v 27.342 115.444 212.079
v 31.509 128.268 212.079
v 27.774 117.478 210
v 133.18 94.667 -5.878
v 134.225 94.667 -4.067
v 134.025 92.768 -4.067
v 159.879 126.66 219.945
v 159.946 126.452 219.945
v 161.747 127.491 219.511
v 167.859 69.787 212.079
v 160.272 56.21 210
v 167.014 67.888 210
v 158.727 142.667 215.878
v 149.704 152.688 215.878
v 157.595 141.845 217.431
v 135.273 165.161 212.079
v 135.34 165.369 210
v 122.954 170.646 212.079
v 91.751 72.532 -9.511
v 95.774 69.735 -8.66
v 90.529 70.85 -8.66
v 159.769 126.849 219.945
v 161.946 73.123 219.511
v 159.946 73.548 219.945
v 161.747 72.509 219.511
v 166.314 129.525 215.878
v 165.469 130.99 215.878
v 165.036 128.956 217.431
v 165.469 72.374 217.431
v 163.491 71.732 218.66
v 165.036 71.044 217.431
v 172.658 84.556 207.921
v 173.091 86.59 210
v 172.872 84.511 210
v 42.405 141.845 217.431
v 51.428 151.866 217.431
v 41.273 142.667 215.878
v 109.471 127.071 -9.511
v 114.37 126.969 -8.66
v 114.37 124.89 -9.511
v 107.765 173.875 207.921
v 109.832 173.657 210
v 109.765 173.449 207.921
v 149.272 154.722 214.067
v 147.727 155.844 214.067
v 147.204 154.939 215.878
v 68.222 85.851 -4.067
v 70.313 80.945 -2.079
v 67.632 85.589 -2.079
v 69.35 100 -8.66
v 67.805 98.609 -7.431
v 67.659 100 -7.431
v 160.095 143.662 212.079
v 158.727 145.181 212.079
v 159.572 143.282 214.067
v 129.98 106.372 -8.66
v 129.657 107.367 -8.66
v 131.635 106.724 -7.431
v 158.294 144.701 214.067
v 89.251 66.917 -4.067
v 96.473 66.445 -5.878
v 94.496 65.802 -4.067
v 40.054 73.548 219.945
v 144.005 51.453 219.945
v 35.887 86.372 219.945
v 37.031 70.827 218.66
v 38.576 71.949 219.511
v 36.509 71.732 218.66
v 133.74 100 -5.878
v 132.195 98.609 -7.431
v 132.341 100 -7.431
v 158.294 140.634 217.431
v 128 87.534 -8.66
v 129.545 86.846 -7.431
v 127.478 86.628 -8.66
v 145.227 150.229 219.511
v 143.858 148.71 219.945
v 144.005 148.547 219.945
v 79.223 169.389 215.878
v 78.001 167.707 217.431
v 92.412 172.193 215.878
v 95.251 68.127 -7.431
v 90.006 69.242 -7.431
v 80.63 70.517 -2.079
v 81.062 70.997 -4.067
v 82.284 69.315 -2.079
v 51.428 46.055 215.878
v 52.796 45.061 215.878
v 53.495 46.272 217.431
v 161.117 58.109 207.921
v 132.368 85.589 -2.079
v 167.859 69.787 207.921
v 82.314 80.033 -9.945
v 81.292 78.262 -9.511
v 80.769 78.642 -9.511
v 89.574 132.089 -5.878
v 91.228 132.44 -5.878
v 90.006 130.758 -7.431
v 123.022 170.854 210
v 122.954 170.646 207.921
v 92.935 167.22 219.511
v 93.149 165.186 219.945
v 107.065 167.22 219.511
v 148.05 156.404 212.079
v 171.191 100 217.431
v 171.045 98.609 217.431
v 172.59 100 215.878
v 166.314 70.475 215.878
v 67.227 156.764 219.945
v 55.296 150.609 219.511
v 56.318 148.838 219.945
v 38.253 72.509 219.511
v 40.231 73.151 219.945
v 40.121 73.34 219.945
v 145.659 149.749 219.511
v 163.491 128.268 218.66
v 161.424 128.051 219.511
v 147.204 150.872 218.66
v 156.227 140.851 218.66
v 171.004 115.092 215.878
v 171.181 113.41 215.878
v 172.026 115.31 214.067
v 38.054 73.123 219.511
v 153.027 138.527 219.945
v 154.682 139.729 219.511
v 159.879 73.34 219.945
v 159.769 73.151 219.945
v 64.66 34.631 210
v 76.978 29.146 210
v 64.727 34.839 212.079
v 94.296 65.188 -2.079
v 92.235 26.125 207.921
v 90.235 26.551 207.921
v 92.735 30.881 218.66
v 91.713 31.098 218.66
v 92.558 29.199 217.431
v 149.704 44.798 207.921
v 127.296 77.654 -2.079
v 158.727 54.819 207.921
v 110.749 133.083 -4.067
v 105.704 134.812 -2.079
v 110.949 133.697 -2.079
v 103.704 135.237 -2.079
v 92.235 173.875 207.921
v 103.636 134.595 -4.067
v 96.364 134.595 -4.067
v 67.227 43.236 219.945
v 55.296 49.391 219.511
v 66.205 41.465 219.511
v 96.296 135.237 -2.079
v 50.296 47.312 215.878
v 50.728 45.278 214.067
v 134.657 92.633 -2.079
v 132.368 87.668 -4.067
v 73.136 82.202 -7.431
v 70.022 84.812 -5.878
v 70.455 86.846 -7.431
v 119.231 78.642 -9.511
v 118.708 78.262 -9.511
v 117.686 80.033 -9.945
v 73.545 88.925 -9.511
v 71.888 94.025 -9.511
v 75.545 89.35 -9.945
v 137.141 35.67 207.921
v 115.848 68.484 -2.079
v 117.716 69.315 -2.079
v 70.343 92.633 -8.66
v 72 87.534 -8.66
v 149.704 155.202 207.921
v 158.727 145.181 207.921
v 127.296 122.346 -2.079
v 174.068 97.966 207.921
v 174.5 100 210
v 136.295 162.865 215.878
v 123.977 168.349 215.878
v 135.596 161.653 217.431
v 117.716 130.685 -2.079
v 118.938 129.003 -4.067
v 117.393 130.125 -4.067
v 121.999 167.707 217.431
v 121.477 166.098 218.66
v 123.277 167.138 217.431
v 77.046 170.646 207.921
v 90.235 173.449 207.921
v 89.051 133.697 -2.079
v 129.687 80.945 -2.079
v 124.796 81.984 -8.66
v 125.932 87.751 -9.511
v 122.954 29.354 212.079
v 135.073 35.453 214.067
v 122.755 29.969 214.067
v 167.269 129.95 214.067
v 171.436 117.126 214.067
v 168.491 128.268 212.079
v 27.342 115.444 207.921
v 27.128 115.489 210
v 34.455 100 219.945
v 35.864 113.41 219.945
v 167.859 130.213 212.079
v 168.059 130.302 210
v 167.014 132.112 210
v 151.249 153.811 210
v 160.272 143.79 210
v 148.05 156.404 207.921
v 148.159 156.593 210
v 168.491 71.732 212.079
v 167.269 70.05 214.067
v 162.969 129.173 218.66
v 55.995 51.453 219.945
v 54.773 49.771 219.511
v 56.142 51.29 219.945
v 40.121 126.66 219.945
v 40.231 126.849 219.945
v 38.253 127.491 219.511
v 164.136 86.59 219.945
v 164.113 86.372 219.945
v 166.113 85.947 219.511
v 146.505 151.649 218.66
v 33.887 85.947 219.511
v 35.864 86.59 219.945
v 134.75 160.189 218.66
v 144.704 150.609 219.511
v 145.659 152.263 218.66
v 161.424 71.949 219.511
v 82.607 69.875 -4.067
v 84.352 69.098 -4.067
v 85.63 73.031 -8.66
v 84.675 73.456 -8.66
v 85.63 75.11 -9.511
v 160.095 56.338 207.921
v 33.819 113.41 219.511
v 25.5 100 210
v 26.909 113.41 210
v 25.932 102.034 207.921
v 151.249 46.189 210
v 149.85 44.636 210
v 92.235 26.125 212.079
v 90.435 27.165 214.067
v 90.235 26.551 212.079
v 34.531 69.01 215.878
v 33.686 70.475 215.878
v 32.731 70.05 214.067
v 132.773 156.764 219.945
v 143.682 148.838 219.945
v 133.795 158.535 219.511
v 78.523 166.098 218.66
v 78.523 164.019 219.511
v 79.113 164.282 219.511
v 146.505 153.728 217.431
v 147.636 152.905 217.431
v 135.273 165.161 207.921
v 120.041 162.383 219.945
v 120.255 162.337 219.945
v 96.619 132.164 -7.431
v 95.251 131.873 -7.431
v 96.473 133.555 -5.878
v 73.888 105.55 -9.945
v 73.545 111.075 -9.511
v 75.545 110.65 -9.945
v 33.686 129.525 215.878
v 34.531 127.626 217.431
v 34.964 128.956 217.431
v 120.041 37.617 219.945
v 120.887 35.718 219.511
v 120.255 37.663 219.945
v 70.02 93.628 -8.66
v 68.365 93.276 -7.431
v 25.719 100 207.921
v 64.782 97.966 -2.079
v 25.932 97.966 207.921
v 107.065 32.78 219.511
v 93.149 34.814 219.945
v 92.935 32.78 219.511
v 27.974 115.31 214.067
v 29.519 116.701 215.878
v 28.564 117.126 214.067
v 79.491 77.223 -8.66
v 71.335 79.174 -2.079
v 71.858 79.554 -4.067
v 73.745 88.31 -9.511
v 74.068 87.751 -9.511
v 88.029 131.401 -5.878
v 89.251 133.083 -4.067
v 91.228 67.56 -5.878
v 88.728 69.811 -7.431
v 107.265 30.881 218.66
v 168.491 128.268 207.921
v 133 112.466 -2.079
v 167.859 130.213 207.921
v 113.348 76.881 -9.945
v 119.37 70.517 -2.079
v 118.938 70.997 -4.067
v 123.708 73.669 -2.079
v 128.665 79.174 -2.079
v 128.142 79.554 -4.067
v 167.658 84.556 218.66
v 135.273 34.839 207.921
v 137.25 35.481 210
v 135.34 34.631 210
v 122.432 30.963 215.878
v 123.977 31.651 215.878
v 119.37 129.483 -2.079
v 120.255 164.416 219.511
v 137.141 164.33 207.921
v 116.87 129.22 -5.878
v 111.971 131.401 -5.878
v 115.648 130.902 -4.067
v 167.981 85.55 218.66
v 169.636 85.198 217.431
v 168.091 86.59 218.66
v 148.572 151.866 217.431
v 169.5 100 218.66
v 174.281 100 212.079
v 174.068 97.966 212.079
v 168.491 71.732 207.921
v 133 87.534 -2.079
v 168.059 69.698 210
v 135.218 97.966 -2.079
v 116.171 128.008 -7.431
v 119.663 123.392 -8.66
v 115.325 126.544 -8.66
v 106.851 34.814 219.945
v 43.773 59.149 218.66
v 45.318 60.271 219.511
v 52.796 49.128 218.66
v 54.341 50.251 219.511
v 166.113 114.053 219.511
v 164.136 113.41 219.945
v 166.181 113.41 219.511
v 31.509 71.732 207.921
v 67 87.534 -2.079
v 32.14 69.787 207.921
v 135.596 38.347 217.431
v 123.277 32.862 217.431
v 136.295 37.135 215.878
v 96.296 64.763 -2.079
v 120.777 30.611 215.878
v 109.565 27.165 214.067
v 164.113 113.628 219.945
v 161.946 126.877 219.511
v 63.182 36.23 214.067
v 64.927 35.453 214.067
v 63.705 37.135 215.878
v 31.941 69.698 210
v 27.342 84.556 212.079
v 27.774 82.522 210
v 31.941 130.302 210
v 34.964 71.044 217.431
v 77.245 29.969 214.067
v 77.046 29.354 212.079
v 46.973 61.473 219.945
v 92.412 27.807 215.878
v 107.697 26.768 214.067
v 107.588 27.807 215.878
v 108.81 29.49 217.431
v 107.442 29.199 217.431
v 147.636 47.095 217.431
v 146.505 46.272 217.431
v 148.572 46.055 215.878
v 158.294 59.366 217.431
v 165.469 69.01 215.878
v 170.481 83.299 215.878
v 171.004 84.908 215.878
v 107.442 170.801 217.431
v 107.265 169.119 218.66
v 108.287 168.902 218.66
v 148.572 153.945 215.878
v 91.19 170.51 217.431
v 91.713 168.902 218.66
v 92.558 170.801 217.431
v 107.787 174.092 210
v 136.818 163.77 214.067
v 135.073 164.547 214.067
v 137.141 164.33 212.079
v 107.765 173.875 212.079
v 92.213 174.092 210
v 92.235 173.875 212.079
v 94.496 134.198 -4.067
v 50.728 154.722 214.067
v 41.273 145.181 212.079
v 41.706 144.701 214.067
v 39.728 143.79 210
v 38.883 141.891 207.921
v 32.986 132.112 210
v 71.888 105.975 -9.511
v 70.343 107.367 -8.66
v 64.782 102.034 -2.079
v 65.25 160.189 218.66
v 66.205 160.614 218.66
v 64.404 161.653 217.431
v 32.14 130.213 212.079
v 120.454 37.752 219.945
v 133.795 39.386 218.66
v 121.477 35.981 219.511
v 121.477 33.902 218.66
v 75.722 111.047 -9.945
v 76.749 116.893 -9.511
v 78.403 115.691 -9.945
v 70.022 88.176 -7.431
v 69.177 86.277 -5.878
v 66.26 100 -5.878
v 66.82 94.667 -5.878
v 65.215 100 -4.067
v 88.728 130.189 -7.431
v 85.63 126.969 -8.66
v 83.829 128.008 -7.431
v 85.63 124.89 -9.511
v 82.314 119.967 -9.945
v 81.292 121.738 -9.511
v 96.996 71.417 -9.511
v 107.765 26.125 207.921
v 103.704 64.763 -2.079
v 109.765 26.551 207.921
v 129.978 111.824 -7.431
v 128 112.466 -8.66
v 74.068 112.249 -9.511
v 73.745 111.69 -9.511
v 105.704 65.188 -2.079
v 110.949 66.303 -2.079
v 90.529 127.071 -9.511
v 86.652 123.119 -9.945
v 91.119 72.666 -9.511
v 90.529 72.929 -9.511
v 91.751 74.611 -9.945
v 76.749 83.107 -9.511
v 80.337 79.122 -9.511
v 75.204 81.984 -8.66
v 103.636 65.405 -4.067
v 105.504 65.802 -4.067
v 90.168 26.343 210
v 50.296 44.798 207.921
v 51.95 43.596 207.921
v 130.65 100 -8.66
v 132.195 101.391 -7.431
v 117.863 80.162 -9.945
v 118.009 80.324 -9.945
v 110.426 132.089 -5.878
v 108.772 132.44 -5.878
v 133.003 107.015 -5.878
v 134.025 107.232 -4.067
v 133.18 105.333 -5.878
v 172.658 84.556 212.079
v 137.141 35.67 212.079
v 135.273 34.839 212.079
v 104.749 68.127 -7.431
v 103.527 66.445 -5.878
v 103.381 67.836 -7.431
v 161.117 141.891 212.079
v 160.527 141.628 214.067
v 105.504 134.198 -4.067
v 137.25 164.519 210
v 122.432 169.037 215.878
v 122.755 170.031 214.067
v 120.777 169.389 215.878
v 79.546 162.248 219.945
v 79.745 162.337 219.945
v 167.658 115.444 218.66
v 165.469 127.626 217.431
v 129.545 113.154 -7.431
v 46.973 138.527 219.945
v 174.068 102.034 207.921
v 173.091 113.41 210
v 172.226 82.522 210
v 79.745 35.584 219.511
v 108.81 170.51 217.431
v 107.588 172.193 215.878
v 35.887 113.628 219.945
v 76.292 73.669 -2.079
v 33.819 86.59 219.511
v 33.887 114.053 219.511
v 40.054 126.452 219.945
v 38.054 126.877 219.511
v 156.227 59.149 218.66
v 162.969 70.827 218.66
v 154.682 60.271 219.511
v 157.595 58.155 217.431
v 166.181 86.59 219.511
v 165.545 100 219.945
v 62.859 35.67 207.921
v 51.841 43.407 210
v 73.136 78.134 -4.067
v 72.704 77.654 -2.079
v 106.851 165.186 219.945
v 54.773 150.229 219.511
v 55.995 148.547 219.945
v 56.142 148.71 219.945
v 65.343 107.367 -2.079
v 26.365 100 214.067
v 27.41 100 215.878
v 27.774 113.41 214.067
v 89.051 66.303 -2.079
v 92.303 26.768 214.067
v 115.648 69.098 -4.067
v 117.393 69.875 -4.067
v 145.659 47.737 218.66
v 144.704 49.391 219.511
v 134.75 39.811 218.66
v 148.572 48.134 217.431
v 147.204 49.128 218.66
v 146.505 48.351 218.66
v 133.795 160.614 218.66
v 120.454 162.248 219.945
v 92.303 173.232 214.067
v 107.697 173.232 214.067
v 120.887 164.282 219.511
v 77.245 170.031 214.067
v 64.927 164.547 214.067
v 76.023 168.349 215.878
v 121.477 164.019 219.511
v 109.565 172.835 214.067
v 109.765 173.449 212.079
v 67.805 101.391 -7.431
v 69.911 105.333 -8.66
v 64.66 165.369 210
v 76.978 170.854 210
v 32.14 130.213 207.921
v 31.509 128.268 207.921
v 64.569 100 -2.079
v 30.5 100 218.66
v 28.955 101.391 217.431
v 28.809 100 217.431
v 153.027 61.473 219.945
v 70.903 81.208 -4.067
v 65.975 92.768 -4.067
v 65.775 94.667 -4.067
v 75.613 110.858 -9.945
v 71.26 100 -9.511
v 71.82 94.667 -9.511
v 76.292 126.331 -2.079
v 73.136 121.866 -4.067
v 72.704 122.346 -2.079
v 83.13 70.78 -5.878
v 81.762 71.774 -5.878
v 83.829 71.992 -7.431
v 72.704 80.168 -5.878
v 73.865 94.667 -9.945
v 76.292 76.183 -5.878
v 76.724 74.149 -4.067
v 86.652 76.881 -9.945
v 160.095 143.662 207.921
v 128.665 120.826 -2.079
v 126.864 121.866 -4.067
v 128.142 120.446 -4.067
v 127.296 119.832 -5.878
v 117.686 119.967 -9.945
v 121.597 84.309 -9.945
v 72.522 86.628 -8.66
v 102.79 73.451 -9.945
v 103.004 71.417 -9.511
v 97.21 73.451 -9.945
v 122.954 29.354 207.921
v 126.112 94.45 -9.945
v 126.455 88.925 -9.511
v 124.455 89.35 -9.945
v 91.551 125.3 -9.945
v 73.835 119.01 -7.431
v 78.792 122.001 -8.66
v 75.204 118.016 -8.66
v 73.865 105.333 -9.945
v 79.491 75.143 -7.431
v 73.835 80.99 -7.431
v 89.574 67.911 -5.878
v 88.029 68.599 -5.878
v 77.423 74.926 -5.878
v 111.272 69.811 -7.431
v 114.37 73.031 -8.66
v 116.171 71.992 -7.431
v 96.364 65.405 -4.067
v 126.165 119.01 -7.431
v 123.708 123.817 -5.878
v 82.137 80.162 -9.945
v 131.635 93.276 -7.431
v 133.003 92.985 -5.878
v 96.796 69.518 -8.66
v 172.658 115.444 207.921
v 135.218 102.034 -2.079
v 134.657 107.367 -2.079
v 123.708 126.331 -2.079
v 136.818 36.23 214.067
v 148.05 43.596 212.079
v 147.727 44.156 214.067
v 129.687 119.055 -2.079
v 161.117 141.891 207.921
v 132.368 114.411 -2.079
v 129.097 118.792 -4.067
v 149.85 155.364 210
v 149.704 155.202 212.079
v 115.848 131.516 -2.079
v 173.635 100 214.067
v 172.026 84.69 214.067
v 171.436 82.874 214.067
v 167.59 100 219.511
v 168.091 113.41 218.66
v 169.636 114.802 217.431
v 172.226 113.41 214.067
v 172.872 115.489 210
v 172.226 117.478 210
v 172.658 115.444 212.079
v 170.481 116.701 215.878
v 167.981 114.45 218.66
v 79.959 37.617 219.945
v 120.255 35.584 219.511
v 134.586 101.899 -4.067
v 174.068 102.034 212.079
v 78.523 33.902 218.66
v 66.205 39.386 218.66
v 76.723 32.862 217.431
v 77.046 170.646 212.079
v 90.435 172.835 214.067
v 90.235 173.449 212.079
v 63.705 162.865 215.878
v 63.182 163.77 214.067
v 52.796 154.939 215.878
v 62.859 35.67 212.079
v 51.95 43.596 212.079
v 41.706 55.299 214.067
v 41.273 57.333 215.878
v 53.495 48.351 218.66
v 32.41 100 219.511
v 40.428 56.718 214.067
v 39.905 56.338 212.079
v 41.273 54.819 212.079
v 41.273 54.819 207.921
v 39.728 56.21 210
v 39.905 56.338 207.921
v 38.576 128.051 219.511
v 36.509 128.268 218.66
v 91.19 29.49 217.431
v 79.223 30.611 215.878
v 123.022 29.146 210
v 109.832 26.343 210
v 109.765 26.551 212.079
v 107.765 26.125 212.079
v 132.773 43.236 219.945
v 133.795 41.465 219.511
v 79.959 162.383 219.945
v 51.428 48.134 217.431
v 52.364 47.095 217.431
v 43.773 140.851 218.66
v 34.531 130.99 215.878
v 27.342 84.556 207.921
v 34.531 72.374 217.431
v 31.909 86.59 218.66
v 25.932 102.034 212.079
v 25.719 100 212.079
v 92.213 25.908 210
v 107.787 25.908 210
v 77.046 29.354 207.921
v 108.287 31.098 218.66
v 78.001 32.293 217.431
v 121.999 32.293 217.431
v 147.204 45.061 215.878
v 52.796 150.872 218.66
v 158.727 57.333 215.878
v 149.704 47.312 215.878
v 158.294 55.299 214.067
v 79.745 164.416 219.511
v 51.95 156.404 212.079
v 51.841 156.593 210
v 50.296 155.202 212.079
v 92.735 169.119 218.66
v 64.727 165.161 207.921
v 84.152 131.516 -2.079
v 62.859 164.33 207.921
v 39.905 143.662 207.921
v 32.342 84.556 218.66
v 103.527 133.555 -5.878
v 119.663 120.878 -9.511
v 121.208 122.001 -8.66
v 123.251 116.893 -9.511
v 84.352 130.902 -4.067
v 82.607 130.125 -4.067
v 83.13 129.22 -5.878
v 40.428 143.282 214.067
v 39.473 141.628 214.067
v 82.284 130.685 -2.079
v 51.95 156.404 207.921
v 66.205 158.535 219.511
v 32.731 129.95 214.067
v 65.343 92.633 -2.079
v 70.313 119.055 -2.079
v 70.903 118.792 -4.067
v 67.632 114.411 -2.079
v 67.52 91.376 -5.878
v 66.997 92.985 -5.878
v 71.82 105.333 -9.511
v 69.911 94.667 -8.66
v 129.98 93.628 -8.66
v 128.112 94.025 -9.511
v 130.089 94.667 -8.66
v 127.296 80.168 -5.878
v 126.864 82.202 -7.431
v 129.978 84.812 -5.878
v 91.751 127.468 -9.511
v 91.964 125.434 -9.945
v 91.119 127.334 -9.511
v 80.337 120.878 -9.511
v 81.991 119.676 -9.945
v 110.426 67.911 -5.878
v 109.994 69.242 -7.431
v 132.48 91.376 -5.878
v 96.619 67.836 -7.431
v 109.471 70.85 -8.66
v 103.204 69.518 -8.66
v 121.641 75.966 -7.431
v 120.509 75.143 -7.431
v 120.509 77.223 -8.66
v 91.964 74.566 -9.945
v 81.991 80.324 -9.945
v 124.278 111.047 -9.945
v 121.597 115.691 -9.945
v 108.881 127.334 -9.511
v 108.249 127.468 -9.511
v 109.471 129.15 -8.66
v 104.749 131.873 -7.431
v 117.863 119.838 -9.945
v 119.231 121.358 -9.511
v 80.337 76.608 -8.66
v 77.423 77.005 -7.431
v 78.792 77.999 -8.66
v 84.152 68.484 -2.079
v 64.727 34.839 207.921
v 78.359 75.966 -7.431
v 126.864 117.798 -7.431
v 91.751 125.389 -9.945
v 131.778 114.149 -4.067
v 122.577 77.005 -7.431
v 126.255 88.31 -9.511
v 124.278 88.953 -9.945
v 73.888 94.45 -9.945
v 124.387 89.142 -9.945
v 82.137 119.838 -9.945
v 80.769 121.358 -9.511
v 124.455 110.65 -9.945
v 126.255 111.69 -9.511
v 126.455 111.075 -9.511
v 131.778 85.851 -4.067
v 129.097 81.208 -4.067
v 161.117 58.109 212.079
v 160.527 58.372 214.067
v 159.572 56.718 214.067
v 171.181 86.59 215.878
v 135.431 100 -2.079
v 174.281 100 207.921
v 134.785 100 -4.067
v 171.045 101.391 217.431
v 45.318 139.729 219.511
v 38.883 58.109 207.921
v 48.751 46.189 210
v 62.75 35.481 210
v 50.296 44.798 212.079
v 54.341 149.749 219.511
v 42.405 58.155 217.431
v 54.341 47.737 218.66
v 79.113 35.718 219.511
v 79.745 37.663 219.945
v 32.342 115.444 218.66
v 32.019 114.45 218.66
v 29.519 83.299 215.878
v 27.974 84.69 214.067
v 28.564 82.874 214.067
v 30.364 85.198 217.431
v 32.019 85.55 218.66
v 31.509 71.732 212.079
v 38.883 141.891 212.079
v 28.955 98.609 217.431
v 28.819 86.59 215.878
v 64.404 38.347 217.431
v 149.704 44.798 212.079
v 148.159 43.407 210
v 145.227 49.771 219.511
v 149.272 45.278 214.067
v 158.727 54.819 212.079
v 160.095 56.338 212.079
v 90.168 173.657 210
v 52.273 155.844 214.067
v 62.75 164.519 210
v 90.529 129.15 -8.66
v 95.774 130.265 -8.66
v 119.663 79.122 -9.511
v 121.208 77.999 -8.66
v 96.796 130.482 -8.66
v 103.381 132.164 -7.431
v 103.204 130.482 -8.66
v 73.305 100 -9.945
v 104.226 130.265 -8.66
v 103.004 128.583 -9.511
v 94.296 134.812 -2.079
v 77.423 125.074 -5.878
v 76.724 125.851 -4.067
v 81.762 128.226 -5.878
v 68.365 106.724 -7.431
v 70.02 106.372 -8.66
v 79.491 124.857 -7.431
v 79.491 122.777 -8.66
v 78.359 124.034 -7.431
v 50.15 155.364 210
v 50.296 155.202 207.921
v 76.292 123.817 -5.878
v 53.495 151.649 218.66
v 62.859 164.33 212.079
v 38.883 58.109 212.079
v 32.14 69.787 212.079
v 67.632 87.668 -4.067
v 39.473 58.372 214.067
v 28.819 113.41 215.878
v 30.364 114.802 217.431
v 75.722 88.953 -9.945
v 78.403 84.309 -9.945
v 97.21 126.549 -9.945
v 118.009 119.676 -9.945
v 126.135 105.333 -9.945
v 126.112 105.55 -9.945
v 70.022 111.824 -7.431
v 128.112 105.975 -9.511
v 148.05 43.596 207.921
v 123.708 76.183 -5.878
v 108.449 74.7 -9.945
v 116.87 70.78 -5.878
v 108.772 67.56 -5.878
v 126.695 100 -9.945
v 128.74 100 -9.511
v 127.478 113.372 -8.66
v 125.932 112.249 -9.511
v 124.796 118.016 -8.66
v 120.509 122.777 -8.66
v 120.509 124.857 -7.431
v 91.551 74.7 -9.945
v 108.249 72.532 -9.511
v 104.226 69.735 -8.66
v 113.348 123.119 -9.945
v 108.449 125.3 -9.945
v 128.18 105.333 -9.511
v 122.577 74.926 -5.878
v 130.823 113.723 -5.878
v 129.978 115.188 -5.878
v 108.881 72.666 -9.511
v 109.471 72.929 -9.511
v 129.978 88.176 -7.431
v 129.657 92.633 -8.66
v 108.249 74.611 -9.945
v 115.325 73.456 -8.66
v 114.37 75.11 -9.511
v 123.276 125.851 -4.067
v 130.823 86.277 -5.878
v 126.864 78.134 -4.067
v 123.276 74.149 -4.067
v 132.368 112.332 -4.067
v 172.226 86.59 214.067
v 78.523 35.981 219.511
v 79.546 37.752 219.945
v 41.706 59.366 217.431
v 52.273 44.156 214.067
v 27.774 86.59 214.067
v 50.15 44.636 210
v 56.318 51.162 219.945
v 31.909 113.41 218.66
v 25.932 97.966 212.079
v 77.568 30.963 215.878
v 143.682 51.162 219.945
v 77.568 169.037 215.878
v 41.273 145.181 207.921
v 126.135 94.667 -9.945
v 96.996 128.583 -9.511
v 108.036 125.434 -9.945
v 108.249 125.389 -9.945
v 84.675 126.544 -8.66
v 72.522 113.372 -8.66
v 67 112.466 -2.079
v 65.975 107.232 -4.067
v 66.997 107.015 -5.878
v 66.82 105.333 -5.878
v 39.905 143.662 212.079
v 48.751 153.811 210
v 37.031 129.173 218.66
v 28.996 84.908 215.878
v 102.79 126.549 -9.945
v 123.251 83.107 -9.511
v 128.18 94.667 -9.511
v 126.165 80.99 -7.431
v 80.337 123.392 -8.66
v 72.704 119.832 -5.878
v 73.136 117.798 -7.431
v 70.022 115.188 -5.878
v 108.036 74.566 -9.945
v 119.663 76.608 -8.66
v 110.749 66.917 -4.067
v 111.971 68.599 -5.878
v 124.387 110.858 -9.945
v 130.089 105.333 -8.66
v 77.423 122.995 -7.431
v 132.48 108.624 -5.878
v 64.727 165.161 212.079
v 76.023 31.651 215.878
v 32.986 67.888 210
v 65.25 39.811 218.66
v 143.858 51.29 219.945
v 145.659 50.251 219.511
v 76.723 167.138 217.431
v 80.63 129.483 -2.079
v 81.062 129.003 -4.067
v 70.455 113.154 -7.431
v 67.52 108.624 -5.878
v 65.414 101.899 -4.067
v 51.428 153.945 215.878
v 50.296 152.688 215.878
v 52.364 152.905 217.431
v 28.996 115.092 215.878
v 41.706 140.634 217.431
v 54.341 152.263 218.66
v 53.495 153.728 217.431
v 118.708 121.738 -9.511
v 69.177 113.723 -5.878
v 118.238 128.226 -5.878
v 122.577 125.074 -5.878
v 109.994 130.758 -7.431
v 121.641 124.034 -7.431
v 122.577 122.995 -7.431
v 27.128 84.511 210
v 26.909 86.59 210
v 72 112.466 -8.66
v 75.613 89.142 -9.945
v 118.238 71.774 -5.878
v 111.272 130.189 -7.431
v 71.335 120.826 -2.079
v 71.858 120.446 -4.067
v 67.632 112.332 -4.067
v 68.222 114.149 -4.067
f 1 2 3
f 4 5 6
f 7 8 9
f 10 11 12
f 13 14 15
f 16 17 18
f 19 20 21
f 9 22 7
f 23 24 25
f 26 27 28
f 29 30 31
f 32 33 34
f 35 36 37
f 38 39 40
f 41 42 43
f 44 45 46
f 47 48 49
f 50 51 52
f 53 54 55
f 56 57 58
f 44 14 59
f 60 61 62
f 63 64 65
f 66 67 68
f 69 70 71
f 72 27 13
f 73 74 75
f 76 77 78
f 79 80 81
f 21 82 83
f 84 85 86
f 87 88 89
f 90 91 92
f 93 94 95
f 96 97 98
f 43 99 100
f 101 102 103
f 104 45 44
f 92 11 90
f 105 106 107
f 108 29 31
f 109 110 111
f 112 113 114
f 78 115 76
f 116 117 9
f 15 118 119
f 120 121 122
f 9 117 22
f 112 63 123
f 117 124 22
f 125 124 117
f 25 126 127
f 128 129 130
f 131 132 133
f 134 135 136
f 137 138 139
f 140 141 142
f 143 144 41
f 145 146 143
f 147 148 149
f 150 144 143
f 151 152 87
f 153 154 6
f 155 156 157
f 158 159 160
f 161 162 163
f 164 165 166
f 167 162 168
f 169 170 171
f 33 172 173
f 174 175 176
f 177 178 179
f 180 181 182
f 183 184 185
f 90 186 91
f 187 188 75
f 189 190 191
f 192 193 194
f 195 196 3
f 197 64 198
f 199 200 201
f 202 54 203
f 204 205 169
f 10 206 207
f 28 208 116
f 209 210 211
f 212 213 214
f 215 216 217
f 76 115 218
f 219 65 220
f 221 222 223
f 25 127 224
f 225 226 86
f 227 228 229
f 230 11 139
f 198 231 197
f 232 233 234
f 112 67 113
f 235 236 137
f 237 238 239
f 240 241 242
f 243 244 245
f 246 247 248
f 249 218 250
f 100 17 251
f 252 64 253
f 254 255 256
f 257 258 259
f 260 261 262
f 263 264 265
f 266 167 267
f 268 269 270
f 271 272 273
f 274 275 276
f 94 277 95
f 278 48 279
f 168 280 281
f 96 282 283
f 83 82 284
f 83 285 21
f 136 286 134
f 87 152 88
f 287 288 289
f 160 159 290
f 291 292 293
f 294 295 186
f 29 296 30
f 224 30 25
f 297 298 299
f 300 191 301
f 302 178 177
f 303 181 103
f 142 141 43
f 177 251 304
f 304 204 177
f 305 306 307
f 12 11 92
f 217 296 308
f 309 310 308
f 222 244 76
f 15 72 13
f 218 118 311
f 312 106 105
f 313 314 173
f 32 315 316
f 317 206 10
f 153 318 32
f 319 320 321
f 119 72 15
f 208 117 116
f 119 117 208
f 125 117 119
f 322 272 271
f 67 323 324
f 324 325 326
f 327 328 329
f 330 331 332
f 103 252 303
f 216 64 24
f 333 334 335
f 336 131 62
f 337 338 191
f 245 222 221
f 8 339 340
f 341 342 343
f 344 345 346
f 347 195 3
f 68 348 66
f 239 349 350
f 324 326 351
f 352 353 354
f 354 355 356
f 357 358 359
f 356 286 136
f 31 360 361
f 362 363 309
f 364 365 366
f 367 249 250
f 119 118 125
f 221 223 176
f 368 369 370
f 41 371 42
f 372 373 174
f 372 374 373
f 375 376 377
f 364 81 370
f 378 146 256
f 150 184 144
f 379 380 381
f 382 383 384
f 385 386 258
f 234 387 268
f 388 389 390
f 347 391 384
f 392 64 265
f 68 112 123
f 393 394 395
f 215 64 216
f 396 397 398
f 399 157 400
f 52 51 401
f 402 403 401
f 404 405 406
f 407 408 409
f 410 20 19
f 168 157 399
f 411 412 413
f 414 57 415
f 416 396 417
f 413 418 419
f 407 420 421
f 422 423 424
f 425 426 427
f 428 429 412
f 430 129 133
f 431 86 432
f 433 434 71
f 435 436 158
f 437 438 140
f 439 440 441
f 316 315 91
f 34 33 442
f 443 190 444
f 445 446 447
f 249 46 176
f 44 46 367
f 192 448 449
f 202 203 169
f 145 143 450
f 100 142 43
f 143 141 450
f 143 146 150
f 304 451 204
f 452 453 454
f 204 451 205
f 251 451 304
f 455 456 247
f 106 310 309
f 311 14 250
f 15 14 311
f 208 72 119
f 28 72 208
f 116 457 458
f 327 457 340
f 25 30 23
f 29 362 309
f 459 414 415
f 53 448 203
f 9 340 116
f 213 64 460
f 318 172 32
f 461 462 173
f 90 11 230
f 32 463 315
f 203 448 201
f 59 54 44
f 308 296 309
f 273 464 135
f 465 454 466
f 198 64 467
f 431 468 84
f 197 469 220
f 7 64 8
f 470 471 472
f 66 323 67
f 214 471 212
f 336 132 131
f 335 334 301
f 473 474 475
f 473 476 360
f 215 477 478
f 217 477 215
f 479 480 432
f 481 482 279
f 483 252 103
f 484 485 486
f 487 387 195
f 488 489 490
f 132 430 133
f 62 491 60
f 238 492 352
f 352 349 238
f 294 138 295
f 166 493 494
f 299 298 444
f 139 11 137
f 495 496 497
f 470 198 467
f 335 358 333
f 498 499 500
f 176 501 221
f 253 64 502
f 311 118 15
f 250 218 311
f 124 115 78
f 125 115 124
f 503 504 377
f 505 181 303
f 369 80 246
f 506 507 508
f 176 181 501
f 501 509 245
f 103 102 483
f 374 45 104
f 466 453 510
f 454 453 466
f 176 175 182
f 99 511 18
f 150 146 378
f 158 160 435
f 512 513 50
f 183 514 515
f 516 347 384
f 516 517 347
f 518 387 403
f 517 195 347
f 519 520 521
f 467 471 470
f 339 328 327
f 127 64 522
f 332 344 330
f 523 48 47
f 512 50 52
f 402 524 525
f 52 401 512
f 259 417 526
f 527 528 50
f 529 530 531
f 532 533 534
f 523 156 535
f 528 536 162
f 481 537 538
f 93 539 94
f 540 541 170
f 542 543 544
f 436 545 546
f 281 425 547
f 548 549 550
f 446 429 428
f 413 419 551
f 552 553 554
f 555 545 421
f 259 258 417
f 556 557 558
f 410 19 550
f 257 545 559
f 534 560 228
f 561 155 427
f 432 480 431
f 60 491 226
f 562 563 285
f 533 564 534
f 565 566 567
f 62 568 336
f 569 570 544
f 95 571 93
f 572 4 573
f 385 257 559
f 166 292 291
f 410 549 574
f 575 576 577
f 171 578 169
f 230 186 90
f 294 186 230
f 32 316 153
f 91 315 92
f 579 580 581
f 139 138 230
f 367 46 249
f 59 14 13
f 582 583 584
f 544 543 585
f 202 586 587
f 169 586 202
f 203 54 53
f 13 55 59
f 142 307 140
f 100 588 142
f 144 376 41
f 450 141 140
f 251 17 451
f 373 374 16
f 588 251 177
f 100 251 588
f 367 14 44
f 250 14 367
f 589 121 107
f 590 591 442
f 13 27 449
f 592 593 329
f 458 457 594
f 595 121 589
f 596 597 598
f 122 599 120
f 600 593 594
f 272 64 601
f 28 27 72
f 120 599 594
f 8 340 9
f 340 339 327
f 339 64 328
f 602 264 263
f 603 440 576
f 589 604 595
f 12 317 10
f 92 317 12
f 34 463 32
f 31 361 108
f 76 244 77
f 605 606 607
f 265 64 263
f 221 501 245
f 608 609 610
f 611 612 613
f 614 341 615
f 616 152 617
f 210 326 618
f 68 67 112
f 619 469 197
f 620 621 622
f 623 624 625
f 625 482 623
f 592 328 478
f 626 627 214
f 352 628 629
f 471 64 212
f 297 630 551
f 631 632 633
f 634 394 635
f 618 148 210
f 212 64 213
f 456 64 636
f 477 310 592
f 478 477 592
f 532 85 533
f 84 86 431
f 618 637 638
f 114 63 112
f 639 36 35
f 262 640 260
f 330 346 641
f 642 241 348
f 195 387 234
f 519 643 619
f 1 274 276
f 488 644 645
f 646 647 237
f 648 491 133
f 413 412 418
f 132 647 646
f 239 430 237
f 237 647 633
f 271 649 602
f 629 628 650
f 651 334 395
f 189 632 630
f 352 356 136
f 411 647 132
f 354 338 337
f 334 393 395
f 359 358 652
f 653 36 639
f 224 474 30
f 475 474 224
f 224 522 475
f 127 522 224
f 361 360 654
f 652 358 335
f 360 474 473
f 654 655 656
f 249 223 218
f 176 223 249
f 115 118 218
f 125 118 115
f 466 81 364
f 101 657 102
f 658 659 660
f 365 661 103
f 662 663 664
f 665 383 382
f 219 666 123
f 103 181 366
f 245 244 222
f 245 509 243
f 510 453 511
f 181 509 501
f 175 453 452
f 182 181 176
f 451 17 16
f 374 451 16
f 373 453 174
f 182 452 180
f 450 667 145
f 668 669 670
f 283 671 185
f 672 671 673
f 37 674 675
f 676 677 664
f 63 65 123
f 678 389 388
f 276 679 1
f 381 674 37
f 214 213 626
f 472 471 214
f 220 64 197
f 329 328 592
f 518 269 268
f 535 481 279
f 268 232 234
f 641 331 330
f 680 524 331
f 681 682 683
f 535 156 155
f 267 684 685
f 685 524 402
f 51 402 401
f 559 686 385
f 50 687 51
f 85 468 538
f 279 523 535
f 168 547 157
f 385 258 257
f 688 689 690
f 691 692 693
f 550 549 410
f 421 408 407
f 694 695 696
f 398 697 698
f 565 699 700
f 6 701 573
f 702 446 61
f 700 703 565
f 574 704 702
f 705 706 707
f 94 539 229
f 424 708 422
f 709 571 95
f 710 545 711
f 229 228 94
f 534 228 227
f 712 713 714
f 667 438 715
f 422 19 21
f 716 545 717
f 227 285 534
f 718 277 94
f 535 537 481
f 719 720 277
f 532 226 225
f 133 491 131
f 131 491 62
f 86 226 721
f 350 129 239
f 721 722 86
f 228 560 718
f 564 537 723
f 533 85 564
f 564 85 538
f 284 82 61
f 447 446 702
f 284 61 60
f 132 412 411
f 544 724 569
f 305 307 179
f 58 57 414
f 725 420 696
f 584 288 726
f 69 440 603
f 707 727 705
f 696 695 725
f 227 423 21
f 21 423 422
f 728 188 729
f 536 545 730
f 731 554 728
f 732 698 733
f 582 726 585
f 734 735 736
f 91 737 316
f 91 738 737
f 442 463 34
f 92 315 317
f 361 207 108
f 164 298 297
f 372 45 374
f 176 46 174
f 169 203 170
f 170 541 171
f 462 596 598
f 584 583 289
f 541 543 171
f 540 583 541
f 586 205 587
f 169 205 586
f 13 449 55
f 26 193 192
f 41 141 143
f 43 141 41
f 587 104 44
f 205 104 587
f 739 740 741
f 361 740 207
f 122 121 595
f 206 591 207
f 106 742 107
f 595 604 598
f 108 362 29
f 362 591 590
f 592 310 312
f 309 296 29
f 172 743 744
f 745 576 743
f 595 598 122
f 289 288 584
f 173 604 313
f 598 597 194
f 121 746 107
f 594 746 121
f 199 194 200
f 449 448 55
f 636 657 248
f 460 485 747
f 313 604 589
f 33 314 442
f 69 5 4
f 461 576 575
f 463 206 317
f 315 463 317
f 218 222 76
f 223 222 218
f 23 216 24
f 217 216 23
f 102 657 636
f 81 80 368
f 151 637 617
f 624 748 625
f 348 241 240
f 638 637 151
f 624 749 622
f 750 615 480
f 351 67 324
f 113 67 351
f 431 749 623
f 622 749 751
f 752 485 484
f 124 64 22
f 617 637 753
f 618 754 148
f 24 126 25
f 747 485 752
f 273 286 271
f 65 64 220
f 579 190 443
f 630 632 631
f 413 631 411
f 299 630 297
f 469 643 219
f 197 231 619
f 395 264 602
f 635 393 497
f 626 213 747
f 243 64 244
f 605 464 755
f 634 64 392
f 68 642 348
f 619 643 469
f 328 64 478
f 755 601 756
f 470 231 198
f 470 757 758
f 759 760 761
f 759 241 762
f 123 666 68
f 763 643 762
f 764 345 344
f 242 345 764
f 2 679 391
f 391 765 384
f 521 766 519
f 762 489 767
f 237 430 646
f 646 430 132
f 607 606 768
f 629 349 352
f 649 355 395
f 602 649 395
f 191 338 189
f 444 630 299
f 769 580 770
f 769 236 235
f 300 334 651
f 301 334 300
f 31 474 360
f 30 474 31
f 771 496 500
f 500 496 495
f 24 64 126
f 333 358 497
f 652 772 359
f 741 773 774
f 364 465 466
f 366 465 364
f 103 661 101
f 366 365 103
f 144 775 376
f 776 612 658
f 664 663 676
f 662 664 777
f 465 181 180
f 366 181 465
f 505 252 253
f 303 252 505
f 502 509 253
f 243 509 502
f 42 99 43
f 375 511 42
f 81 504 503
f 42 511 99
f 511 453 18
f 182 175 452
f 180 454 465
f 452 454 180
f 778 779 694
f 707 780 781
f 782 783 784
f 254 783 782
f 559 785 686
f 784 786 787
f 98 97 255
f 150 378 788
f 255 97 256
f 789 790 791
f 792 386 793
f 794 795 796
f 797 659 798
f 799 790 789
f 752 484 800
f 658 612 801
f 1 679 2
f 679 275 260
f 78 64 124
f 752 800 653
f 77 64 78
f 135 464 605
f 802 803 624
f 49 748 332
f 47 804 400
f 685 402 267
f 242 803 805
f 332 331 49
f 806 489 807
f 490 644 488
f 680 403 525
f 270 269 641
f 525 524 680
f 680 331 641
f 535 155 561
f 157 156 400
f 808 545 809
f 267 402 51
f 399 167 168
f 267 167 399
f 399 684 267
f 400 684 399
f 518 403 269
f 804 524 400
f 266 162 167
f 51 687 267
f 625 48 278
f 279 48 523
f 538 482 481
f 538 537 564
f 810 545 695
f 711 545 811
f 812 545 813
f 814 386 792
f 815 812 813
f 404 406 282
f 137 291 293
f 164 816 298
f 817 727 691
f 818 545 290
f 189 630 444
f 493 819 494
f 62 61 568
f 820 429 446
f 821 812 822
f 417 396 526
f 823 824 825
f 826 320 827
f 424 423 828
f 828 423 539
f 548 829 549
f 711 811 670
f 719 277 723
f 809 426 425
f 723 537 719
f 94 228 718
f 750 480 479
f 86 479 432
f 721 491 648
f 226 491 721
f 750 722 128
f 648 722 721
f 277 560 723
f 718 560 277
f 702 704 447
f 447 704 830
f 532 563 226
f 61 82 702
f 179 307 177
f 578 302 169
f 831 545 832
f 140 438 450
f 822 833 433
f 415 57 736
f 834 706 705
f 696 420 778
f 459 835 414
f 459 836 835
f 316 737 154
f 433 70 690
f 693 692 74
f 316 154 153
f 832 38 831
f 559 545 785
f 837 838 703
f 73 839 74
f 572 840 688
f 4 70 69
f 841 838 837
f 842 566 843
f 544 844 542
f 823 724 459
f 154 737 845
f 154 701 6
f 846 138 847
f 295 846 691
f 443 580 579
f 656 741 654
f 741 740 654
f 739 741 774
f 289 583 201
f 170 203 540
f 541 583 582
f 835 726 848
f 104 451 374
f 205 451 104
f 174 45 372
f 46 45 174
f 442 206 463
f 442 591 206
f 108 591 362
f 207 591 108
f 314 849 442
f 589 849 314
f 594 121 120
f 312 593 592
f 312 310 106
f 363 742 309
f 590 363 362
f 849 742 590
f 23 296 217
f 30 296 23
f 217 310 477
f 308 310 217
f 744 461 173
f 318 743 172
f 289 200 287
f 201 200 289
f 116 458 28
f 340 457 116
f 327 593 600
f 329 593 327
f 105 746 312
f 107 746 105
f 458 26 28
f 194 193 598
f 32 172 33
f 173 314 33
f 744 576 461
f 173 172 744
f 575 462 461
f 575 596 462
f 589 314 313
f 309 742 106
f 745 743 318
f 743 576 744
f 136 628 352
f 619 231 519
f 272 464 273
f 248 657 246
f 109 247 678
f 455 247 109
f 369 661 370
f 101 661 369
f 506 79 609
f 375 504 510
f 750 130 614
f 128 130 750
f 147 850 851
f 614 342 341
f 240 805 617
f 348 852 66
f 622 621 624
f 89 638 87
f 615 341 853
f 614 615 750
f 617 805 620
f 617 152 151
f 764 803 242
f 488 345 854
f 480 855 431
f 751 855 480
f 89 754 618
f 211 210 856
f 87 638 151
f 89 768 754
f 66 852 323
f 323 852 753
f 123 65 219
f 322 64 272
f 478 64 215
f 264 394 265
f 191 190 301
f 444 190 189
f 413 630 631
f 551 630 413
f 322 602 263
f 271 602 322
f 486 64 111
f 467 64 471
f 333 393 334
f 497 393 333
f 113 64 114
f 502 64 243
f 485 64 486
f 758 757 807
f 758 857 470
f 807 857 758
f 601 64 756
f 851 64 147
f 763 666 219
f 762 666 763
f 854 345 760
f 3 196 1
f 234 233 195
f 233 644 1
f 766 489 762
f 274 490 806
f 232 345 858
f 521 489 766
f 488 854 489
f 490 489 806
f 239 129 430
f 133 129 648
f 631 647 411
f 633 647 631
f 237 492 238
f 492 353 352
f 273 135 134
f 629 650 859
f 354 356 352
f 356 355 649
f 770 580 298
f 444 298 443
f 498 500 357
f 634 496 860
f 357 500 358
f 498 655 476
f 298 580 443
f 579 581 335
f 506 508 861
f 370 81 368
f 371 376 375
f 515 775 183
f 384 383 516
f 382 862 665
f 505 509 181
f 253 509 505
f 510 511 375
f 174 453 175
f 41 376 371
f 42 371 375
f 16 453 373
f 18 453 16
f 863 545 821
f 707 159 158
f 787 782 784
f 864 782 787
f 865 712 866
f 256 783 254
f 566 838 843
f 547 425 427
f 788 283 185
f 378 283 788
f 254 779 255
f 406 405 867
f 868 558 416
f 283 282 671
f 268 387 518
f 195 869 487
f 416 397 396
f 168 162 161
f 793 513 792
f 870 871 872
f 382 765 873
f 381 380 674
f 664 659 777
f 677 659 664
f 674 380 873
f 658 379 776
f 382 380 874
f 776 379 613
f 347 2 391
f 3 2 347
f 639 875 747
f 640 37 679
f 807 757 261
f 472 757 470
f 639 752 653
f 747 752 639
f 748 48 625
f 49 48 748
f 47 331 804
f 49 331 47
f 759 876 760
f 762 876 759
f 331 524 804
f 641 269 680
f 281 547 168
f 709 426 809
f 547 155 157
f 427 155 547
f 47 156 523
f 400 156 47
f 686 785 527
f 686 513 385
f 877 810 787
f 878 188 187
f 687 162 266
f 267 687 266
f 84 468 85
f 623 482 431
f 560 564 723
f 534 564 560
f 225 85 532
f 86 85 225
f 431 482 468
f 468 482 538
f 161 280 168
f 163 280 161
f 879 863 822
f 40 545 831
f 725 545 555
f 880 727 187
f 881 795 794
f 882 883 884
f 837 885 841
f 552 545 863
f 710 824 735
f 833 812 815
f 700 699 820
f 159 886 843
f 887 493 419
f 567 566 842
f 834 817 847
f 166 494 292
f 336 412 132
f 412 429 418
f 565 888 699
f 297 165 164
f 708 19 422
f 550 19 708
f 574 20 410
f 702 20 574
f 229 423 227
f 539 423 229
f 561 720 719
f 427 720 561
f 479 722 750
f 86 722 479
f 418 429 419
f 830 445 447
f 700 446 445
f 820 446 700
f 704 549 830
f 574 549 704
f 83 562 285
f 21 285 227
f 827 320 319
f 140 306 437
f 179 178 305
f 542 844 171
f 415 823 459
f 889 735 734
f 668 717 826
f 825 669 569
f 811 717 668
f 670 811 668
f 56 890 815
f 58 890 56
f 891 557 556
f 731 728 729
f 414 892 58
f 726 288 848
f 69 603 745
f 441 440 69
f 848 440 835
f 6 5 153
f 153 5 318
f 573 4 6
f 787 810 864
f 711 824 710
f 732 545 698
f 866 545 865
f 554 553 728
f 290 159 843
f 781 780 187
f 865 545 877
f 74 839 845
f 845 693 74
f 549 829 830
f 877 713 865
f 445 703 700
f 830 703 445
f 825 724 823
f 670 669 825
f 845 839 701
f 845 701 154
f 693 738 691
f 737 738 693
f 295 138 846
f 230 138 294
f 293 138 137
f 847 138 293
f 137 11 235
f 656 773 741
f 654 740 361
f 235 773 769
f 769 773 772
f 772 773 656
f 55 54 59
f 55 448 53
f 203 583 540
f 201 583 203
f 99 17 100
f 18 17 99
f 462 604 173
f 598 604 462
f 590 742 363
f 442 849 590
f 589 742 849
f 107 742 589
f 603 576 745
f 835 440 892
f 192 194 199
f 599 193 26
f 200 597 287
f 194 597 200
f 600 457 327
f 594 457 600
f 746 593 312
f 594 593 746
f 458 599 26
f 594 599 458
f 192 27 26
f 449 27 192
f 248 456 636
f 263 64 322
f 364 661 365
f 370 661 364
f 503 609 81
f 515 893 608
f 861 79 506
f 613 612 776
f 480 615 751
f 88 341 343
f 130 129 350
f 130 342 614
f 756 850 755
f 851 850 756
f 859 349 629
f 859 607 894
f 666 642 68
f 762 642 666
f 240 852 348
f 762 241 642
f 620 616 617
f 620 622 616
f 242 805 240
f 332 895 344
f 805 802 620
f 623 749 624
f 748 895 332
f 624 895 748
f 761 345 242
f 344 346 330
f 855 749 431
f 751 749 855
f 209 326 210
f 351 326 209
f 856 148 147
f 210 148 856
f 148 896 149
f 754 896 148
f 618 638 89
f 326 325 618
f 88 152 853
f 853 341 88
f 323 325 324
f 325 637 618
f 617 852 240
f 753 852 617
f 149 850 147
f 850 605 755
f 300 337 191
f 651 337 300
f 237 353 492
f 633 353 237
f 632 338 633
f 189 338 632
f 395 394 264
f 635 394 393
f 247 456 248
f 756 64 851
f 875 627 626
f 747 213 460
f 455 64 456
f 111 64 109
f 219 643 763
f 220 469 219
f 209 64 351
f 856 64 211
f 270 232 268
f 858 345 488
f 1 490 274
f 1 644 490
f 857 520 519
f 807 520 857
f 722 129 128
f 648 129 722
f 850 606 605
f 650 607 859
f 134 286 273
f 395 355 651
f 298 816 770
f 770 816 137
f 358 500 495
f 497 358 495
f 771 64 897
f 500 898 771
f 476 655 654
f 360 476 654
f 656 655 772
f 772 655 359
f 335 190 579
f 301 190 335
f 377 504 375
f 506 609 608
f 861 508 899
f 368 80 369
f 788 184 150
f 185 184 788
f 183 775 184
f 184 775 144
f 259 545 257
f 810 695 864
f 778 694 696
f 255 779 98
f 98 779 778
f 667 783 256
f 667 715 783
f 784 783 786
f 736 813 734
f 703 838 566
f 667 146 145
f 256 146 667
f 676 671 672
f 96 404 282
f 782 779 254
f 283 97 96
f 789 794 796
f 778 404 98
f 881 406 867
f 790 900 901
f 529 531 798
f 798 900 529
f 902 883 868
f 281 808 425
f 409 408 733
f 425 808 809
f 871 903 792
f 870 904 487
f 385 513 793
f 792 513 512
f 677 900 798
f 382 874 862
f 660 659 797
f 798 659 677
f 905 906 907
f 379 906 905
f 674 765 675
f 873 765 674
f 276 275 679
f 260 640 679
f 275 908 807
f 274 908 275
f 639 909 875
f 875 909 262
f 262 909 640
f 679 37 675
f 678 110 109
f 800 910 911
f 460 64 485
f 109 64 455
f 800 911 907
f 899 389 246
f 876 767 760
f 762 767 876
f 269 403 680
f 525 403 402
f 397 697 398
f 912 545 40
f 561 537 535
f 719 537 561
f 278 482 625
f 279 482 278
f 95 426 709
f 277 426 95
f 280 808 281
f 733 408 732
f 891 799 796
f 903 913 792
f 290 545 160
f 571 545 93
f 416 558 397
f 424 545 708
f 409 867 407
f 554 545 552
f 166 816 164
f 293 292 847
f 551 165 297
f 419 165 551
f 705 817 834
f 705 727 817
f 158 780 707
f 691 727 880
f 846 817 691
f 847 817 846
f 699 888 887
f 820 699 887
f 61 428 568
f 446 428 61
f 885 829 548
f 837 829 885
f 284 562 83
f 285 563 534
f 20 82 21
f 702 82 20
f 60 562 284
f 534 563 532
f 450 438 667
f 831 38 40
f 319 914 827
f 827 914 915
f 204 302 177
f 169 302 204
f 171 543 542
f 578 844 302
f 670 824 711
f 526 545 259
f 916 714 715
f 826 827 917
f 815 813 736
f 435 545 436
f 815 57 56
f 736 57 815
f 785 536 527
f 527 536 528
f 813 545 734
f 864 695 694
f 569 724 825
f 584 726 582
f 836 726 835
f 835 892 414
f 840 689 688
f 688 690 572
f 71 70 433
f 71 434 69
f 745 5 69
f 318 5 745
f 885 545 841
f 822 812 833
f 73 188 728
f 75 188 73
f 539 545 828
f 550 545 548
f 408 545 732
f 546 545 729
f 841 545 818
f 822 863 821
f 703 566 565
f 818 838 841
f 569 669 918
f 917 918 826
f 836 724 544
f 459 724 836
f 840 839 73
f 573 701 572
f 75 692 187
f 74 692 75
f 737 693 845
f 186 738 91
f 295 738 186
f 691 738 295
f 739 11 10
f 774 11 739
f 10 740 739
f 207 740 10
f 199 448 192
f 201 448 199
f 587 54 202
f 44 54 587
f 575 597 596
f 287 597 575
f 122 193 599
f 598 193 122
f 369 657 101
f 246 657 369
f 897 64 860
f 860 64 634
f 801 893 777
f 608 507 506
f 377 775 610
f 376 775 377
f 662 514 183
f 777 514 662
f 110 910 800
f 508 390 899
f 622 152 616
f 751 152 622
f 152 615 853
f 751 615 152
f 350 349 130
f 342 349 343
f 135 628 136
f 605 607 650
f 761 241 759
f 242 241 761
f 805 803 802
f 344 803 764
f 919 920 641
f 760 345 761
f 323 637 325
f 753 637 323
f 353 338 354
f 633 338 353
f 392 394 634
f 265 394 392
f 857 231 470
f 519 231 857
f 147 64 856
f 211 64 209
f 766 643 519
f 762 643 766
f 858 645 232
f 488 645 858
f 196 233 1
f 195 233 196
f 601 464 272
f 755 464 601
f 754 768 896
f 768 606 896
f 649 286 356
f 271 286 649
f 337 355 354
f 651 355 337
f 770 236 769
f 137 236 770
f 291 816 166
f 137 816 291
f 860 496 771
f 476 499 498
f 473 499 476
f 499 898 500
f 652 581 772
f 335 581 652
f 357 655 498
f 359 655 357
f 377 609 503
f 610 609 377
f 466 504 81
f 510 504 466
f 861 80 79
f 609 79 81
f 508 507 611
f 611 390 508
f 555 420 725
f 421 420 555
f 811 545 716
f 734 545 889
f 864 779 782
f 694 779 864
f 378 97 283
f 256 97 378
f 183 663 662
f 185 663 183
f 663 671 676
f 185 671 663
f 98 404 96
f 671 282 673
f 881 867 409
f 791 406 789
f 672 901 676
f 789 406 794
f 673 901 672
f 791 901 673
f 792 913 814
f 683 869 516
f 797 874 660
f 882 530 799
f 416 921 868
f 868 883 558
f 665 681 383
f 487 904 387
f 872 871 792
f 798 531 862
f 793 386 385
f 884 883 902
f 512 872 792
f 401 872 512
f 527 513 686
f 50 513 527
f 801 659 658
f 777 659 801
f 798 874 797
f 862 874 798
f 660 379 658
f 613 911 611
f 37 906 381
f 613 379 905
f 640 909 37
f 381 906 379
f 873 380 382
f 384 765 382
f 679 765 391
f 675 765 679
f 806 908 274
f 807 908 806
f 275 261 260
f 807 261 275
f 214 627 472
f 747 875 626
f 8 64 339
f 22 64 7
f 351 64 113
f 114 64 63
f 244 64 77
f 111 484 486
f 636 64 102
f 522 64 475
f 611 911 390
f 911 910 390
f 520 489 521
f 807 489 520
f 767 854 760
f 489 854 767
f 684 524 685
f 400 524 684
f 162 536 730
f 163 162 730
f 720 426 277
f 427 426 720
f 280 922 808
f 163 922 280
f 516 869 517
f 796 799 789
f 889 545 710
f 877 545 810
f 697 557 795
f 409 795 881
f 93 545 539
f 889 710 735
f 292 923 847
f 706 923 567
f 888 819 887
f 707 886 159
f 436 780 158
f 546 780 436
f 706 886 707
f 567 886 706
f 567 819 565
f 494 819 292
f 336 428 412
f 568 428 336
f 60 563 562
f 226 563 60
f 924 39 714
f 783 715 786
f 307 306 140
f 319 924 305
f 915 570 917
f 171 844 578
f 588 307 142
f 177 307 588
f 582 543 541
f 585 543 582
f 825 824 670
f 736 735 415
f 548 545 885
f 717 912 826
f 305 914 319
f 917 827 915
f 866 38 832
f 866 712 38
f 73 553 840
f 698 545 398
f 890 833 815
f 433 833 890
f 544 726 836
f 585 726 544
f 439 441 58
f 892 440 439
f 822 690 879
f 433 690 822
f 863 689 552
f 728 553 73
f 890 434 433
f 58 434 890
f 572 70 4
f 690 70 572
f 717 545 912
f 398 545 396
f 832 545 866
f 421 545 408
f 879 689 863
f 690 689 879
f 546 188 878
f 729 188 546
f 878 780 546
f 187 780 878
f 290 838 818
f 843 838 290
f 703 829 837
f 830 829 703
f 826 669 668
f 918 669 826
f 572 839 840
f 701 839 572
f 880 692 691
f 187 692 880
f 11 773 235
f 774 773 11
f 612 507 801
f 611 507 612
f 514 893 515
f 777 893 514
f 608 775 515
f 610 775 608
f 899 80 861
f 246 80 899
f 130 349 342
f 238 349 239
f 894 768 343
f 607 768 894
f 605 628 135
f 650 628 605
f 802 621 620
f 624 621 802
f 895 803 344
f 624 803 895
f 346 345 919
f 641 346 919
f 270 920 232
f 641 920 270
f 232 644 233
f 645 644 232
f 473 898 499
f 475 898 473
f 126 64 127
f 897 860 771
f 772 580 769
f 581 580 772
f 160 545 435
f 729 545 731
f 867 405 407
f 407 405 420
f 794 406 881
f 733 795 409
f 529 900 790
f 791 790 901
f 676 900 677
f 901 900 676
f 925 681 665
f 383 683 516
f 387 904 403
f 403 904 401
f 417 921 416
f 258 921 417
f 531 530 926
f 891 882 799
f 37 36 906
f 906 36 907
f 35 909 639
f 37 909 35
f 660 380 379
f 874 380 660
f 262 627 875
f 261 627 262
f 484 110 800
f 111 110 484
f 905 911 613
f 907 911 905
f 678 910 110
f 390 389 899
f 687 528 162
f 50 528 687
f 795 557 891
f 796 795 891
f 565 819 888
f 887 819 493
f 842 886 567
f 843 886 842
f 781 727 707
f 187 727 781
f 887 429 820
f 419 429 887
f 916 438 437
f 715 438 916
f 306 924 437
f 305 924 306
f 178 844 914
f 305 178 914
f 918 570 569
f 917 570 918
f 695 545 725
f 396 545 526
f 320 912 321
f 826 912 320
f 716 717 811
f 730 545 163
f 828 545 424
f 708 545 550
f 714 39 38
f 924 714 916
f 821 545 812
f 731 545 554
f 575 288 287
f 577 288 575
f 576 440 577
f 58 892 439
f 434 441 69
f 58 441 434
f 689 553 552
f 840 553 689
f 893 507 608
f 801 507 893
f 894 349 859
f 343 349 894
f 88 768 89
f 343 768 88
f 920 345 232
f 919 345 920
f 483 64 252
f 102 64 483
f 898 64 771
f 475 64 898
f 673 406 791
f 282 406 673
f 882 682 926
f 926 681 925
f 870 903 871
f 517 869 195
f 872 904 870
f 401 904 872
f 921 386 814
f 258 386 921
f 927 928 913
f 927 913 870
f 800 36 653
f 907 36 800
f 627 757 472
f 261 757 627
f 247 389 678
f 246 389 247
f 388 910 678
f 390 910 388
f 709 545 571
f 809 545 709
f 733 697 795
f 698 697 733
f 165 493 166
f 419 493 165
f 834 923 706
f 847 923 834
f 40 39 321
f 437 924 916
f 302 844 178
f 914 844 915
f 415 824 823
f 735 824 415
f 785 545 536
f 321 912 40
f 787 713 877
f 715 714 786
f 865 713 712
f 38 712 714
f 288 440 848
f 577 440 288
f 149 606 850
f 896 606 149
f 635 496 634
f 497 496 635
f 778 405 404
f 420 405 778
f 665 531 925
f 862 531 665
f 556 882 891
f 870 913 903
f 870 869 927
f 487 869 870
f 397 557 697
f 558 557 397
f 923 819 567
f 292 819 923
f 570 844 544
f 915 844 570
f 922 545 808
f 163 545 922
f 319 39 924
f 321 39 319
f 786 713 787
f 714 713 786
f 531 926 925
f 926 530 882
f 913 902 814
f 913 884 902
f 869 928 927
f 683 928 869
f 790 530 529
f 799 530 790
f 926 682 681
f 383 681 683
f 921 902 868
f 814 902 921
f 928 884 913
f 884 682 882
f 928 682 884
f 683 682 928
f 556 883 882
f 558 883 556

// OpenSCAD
s = 200; // spacing
h = 210;
d1 = 51.3;
d2 = 129.0;

$fn = 30;
minkowski() {
	  translate([s * 0.5, s * 0.5]) cylinder(r1 = d1/2, r2 = d2/2, h = h);
	  sphere(10);
}
